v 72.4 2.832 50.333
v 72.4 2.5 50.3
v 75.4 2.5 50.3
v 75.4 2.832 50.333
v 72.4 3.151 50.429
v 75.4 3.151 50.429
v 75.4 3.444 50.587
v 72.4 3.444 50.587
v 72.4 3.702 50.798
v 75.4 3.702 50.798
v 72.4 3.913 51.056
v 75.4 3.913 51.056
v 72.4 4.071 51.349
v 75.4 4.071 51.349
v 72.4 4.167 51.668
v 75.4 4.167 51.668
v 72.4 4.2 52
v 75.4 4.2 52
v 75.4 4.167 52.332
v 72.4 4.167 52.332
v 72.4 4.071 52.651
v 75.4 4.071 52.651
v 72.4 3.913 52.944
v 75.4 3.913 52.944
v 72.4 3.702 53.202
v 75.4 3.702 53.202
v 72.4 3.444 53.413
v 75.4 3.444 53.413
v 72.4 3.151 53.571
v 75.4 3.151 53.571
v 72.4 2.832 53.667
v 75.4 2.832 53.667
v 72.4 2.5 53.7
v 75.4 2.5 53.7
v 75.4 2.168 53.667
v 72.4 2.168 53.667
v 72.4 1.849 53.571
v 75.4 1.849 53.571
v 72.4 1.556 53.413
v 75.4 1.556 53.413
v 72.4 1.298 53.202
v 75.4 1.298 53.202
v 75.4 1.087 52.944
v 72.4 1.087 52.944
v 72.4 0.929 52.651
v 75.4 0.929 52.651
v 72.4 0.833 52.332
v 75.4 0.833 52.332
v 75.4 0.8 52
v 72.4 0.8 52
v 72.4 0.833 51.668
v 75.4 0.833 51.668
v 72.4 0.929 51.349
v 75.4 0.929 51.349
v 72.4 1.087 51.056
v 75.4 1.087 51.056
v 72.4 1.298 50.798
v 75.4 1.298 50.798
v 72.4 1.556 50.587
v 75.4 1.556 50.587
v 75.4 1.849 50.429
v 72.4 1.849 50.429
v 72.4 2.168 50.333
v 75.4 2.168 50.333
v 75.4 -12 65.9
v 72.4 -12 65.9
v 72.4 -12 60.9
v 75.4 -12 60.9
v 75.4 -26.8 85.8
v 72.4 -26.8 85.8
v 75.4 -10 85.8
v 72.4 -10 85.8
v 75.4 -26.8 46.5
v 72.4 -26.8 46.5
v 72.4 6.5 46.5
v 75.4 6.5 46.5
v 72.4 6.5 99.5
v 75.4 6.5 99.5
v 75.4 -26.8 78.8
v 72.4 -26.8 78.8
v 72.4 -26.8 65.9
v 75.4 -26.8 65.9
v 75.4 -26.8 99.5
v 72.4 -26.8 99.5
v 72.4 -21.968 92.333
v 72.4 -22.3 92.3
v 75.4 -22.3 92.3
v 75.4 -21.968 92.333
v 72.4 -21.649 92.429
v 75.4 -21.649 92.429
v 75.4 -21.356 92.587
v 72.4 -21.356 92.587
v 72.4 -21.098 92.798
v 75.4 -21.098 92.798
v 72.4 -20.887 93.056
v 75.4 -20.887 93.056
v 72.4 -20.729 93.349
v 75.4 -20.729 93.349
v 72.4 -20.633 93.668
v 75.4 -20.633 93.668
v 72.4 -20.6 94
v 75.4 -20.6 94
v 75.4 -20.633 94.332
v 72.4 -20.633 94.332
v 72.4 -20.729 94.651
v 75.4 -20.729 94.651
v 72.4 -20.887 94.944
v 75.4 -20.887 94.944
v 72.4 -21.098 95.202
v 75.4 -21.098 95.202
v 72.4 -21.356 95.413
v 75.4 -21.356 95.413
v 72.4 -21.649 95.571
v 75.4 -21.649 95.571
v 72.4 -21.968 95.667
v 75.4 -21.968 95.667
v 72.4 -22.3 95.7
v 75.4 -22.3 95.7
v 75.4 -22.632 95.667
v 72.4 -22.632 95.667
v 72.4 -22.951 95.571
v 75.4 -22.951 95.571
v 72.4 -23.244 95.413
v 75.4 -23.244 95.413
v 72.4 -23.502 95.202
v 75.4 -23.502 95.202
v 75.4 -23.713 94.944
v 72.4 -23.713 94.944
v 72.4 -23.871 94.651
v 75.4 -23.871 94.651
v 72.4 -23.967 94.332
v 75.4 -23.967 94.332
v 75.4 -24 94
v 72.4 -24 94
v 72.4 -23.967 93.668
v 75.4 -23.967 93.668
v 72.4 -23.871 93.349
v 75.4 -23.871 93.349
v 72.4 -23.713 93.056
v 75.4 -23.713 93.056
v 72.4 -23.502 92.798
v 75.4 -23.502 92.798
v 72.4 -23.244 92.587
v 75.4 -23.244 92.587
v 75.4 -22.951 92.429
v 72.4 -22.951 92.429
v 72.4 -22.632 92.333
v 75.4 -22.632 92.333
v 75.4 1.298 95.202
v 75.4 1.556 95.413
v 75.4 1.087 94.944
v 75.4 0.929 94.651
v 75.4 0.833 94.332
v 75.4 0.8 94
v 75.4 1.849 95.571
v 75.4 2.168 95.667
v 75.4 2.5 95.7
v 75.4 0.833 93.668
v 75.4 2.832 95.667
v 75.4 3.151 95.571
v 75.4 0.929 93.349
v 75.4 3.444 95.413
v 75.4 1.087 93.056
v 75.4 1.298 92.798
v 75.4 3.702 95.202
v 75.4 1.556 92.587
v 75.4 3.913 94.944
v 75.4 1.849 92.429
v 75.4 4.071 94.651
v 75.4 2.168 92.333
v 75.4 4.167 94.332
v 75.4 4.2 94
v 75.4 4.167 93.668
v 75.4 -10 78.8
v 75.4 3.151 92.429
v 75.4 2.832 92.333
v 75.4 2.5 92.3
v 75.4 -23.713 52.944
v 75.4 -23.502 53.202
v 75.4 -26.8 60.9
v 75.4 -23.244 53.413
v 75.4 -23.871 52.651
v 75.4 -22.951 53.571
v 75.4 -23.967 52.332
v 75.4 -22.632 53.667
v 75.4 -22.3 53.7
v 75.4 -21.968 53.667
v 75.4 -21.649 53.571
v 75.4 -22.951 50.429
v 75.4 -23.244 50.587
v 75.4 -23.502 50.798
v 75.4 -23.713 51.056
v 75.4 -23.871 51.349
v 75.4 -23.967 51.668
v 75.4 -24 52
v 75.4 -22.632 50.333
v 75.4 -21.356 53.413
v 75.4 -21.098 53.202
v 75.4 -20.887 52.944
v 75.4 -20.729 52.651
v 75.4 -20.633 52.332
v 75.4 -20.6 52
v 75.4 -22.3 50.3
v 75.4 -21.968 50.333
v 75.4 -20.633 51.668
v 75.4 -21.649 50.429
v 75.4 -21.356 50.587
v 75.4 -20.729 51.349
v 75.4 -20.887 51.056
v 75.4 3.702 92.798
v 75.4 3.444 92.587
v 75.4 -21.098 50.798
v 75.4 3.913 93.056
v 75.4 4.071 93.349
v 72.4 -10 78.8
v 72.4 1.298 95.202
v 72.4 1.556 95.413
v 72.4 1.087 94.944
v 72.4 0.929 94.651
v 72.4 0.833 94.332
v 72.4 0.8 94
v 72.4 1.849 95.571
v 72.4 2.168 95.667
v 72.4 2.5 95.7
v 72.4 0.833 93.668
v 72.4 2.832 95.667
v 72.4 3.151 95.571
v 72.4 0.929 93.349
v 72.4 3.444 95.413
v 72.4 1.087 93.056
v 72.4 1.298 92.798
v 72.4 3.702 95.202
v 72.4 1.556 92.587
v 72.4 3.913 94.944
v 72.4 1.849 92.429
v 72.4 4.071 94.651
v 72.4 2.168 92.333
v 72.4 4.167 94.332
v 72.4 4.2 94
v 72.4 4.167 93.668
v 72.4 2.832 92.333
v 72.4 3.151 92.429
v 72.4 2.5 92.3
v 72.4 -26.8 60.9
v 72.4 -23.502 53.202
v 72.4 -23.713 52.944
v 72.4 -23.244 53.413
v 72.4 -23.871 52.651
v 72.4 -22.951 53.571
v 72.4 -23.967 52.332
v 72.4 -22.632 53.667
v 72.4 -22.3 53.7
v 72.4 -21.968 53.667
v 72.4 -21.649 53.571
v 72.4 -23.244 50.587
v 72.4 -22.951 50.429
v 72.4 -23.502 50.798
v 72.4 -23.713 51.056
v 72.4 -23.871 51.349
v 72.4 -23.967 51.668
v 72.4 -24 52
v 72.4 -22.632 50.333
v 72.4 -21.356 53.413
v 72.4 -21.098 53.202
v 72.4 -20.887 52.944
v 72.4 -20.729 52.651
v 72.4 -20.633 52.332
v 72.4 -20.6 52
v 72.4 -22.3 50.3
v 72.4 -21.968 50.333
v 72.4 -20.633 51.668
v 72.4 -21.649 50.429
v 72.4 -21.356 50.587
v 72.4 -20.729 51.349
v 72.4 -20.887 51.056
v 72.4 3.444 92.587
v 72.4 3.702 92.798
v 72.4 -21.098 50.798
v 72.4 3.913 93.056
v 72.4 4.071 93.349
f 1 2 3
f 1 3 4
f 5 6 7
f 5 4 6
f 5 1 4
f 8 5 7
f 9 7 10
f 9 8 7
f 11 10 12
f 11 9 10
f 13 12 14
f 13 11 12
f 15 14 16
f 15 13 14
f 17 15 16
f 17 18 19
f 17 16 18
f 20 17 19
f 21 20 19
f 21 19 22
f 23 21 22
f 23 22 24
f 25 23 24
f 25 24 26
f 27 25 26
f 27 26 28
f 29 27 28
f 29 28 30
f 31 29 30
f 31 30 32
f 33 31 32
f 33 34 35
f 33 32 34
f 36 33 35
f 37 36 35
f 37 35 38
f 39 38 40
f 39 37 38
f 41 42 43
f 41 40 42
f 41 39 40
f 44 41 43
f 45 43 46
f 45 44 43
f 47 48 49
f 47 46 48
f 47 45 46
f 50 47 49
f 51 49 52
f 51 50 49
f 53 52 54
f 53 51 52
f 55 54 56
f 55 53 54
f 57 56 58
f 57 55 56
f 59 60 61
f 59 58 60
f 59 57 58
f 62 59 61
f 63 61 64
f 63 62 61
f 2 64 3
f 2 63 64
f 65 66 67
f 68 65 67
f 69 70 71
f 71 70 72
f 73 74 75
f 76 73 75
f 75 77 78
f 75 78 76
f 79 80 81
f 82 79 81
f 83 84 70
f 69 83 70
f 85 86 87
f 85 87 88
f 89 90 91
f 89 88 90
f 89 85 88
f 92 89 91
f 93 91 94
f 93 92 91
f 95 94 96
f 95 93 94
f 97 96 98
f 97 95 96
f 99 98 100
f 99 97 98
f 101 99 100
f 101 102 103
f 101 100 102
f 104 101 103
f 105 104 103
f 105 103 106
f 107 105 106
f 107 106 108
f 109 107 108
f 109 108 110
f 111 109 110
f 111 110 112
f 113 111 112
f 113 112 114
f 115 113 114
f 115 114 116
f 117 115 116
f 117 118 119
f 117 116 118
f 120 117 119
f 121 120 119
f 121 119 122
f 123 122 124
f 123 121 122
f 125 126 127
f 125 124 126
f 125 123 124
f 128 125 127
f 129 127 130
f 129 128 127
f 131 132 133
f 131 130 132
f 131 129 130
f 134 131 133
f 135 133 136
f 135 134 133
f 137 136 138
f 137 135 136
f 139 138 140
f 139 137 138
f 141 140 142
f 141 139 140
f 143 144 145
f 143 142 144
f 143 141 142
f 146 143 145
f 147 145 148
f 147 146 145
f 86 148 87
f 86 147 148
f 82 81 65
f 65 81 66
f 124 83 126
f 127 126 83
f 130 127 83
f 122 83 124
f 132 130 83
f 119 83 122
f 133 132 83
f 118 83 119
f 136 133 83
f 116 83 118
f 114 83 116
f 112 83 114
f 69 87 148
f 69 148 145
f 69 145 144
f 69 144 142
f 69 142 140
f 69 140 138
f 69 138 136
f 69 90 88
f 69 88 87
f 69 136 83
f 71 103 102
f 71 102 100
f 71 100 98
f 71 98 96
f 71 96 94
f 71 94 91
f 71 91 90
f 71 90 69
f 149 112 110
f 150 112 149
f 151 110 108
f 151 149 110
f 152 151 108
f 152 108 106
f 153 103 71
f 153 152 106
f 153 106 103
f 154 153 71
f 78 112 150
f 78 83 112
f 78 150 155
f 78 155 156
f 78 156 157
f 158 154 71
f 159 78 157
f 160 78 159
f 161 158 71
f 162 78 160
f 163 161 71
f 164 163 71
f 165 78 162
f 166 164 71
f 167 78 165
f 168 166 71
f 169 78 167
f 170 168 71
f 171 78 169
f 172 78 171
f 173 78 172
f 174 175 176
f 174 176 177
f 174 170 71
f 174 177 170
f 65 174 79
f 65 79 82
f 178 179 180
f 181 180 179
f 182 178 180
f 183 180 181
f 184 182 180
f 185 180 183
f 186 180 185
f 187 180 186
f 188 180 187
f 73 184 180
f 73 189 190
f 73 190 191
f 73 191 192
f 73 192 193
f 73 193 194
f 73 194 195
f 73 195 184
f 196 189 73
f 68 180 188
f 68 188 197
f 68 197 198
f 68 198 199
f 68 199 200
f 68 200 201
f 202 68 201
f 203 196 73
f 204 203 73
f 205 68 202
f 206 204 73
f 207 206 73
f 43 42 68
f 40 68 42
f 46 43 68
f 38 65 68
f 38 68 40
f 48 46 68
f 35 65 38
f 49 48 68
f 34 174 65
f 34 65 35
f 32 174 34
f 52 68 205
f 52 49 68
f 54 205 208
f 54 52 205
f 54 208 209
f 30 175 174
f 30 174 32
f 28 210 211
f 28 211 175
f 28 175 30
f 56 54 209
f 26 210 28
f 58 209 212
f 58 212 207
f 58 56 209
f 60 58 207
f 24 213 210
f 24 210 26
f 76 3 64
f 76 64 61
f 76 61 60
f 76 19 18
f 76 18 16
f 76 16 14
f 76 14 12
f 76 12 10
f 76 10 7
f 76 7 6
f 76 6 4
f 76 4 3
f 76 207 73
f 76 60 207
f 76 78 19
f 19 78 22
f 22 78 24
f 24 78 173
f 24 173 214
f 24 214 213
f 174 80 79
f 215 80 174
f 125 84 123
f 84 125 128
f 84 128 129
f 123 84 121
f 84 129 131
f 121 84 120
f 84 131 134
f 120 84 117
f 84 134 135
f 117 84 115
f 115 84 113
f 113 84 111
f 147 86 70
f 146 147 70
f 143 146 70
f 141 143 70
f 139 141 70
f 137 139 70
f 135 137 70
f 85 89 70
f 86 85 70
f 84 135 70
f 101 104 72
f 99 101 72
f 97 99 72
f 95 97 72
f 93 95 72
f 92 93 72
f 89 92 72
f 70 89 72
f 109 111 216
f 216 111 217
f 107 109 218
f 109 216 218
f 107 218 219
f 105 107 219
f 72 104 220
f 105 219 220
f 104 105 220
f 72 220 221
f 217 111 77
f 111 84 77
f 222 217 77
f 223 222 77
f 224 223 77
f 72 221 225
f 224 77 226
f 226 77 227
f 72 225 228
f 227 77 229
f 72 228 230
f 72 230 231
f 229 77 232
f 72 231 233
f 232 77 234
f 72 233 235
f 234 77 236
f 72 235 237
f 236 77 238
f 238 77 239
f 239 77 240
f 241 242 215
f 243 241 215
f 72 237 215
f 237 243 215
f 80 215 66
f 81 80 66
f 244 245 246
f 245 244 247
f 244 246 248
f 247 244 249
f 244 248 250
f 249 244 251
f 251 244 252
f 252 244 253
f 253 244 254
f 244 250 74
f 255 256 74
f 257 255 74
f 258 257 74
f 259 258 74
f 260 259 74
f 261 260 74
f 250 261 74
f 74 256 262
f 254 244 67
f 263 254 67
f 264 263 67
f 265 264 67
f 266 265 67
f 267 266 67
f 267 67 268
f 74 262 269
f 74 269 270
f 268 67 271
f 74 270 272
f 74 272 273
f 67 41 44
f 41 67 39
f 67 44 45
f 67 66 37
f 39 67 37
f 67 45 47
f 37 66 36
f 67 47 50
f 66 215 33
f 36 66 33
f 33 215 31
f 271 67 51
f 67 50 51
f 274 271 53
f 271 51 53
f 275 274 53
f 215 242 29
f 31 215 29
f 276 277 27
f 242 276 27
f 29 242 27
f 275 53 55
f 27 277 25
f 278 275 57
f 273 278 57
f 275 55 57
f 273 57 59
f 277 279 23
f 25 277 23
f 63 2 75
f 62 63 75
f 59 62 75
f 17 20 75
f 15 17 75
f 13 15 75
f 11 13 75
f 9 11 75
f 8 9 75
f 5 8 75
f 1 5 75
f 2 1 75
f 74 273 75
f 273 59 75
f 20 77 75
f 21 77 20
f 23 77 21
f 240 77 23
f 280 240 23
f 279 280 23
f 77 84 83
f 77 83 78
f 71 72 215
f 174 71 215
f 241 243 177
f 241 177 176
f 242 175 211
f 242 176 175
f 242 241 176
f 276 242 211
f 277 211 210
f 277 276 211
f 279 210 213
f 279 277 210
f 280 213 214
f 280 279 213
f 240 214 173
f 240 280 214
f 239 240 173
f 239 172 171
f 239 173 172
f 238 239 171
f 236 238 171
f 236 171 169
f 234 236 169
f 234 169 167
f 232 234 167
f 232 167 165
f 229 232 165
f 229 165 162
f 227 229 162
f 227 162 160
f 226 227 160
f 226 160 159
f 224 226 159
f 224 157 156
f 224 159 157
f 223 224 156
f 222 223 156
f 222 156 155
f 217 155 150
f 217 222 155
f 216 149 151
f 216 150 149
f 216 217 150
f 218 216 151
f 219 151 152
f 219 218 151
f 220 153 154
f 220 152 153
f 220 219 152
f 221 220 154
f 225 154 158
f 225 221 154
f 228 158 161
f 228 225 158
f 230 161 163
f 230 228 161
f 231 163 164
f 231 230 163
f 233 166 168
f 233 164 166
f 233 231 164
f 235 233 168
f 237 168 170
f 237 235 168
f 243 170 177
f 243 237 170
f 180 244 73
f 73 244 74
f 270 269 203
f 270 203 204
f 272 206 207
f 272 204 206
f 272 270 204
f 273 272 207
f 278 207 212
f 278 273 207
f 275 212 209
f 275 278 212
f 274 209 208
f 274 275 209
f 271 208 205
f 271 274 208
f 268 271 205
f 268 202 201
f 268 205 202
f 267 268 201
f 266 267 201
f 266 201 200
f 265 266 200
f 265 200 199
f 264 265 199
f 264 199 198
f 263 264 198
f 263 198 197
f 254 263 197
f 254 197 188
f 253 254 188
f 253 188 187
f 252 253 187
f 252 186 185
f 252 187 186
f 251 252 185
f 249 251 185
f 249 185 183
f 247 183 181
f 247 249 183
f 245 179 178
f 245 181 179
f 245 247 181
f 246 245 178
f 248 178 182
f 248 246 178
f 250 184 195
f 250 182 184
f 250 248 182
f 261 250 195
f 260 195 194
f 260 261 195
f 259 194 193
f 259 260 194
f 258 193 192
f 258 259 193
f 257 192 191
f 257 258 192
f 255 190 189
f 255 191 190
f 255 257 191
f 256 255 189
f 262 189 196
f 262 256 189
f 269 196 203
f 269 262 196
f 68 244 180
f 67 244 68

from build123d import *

# Parameters (mm, degrees)
SKETCH1_W           = 53
SKETCH1_H           = 33.3
COVER_PLATE_DEPTH   = 3
SKETCH2_W           = 7
SKETCH2_H           = 17.8
SKETCH2_W_2         = 5
SKETCH2_H_2         = 15.8
CABLE_NOTCHES_DEPTH = 5
SKETCH3_R           = 1.7
SCREW_HOLES_DEPTH   = 5


with BuildPart() as part:
    # Sketch1 → Cover Plate (new body)
    with BuildSketch(Plane(origin=(72.4, 0, 0), x_dir=(0, 0, -1), z_dir=(1, 0, 0))):
        with Locations((-73, -10.15)):
            Rectangle(SKETCH1_W, SKETCH1_H)
    extrude(amount=COVER_PLATE_DEPTH)

    # Sketch2 → Cable Notches (cut)
    with BuildSketch(Plane(origin=(71.4, 0, 0), x_dir=(0, 0, -1), z_dir=(1, 0, 0))):
        with Locations((-82.3, -18.9)):
            Rectangle(SKETCH2_W, SKETCH2_H)
        with Locations((-63.4, -19.9)):
            Rectangle(SKETCH2_W_2, SKETCH2_H_2)
    extrude(amount=CABLE_NOTCHES_DEPTH, mode=Mode.SUBTRACT)

    # Sketch3 → Screw Holes (cut)
    with BuildSketch(Plane(origin=(71.4, 0, 0), x_dir=(0, 0, -1), z_dir=(1, 0, 0))):
        with Locations((-94, -22.3)):
            Circle(SKETCH3_R)
        with Locations((-94, 2.5)):
            Circle(SKETCH3_R)
        with Locations((-52, -22.3)):
            Circle(SKETCH3_R)
        with Locations((-52, 2.5)):
            Circle(SKETCH3_R)
    extrude(amount=SCREW_HOLES_DEPTH, mode=Mode.SUBTRACT)


solid = part.part
